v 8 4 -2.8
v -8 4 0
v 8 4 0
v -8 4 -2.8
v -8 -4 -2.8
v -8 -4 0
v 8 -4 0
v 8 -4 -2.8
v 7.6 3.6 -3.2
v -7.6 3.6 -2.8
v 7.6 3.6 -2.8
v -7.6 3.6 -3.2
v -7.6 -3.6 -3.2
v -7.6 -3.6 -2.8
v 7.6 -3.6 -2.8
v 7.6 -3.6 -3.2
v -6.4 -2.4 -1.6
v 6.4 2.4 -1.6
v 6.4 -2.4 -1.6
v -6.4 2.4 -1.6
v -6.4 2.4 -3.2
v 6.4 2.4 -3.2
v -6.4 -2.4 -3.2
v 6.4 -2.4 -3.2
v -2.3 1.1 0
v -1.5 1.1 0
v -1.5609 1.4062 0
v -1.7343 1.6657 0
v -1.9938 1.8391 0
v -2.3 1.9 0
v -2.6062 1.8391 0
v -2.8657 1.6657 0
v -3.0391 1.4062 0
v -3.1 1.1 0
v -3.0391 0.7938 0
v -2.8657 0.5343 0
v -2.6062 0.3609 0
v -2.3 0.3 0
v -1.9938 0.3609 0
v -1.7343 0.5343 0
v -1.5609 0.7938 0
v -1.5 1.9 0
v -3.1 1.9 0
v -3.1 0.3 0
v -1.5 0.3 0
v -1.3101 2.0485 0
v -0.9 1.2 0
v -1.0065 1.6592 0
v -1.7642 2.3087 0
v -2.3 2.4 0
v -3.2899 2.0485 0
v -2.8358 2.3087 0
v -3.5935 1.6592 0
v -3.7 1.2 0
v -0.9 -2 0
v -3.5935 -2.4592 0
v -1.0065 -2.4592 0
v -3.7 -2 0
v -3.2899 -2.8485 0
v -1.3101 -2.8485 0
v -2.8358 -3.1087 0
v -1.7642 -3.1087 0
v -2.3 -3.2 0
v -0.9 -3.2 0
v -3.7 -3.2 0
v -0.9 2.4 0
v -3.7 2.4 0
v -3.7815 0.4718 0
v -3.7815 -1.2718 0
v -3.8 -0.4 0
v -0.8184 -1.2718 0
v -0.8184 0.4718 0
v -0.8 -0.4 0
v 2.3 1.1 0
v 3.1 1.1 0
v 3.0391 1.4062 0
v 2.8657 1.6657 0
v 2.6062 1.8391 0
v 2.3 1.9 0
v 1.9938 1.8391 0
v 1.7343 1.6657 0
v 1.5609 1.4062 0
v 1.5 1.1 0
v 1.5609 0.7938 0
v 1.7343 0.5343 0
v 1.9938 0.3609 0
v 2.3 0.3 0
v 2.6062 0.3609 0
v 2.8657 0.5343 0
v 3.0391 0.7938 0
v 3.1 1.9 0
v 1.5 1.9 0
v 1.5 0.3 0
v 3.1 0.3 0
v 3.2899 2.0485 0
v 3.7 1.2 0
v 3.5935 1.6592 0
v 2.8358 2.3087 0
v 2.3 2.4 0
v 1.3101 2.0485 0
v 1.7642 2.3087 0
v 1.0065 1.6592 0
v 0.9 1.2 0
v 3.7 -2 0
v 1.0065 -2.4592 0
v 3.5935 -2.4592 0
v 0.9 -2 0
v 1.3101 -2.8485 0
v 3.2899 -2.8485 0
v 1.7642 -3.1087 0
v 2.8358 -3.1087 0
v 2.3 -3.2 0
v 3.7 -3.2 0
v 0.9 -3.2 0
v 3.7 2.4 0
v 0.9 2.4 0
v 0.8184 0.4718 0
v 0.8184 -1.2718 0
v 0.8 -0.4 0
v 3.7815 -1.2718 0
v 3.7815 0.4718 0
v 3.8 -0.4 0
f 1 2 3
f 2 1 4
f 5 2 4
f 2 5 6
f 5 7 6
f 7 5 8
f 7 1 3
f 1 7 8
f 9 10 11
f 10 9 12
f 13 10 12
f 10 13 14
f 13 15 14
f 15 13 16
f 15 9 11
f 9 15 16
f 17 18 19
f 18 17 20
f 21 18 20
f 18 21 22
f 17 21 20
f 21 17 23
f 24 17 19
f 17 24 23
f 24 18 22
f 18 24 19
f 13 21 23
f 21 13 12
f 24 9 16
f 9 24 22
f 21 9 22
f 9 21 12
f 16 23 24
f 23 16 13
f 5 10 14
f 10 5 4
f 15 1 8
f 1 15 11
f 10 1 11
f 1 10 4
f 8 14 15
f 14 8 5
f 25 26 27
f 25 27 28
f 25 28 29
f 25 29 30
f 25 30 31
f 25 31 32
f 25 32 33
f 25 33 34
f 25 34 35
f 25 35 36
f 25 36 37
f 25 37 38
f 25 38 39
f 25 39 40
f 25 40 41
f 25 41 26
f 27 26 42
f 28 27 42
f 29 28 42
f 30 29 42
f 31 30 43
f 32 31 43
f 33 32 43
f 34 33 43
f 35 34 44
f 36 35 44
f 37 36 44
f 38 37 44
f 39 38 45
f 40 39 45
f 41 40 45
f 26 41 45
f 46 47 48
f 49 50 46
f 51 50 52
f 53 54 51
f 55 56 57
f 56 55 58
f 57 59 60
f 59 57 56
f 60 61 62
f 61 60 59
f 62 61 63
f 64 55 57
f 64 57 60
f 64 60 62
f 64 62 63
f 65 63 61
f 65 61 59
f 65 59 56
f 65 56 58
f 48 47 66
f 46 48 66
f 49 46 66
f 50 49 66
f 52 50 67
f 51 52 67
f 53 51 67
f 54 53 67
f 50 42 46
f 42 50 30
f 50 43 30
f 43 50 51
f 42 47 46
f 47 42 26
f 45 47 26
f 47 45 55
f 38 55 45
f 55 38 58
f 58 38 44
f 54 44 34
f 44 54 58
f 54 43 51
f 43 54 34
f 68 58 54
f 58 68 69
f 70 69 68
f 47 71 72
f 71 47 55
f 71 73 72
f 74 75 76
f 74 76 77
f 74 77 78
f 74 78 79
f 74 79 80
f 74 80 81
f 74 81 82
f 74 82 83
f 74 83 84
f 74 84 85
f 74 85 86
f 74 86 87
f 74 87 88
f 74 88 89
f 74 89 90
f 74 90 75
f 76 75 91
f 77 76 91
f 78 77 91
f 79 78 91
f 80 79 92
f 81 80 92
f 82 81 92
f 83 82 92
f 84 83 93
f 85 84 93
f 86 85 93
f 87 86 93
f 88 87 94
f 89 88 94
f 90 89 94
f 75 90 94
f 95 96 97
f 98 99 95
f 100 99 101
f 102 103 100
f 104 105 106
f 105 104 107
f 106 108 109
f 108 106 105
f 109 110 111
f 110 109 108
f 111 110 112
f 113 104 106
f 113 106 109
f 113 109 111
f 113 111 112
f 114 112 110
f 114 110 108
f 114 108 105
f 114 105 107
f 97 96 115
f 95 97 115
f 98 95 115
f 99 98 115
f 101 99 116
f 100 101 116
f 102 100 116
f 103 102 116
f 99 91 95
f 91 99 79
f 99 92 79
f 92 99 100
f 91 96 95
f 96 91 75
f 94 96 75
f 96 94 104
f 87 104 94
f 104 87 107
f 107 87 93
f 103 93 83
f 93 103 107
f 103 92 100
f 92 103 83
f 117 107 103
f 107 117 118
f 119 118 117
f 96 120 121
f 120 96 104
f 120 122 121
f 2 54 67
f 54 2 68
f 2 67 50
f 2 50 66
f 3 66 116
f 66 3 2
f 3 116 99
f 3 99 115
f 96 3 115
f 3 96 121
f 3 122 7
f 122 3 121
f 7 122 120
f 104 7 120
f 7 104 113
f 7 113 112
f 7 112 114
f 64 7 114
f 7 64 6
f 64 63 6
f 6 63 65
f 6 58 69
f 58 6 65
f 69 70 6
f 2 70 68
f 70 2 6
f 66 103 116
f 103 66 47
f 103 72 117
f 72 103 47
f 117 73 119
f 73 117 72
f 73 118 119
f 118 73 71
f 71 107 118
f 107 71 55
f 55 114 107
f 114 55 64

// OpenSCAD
// file: ../p/box5.scad
use <../lib.scad>
function ldraw_lib__box5() = [
// 0 Box with 5 Faces and All Edges
// 0 Name: box5.dat
// 0 Author: James Jessiman
// 0 !LDRAW_ORG Primitive UPDATE 2012-01
// 0 !LICENSE Licensed under CC BY 2.0 and CC BY 4.0 : see CAreadme.txt
// 
// 0 BFC CERTIFY CCW
  [0,"BFC","CERTIFY"],
  [0,"BFC","CCW"],
// 
// 0 !HISTORY 2002-04-03 [sbliss] Modified for BFC compliance
// 0 !HISTORY 2002-04-25 [PTadmin] Official Update 2002-02
// 0 !HISTORY 2007-06-24 [PTadmin] Header formatted for Contributor Agreement
// 0 !HISTORY 2008-07-01 [PTadmin] Official Update 2008-01
// 0 !HISTORY 2012-02-16 [Philo] Changed to CCW
// 0 !HISTORY 2012-03-30 [PTadmin] Official Update 2012-01
// 
// 
// 2 24 1 1 1 -1 1 1
  [2,24,1,1,1,-1,1,1],
// 2 24 -1 1 1 -1 1 -1
  [2,24,-1,1,1,-1,1,-1],
// 2 24 -1 1 -1 1 1 -1
  [2,24,-1,1,-1,1,1,-1],
// 2 24 1 1 -1 1 1 1
  [2,24,1,1,-1,1,1,1],
// 2 24 1 0 1 -1 0 1
  [2,24,1,0,1,-1,0,1],
// 2 24 -1 0 1 -1 0 -1
  [2,24,-1,0,1,-1,0,-1],
// 2 24 -1 0 -1 1 0 -1
  [2,24,-1,0,-1,1,0,-1],
// 2 24 1 0 -1 1 0 1
  [2,24,1,0,-1,1,0,1],
// 2 24 1 0 1 1 1 1
  [2,24,1,0,1,1,1,1],
// 2 24 -1 0 1 -1 1 1
  [2,24,-1,0,1,-1,1,1],
// 2 24 1 0 -1 1 1 -1
  [2,24,1,0,-1,1,1,-1],
// 2 24 -1 0 -1 -1 1 -1
  [2,24,-1,0,-1,-1,1,-1],
// 4 16 -1 1 1 1 1 1 1 1 -1 -1 1 -1
  [4,16,-1,1,1,1,1,1,1,1,-1,-1,1,-1],
// 4 16 -1 1 1 -1 0 1 1 0 1 1 1 1
  [4,16,-1,1,1,-1,0,1,1,0,1,1,1,1],
// 4 16 -1 1 -1 -1 0 -1 -1 0 1 -1 1 1
  [4,16,-1,1,-1,-1,0,-1,-1,0,1,-1,1,1],
// 4 16 1 1 -1 1 0 -1 -1 0 -1 -1 1 -1
  [4,16,1,1,-1,1,0,-1,-1,0,-1,-1,1,-1],
// 4 16 1 1 1 1 0 1 1 0 -1 1 1 -1
  [4,16,1,1,1,1,0,1,1,0,-1,1,1,-1],
];
makepoly(ldraw_lib__box5(), line=0.2);
// file: ../p/box4.scad
use <../lib.scad>
function ldraw_lib__box4() = [
// 0 Box with 4 Faces (2 Parallel Pairs) and All Edges
// 0 Name: box4.dat
// 0 Author: James Jessiman
// 0 !LDRAW_ORG Primitive UPDATE 2012-01
// 0 !LICENSE Licensed under CC BY 2.0 and CC BY 4.0 : see CAreadme.txt
// 
// 0 BFC CERTIFY CCW
  [0,"BFC","CERTIFY"],
  [0,"BFC","CCW"],
// 
// 0 !HISTORY 2002-04-03 [sbliss] Modified for BFC compliance
// 0 !HISTORY 2002-04-25 [PTadmin] Official Update 2002-02
// 0 !HISTORY 2007-06-24 [PTadmin] Header formatted for Contributor Agreement
// 0 !HISTORY 2008-07-01 [PTadmin] Official Update 2008-01
// 0 !HISTORY 2012-02-16 [Philo] Changed to CCW
// 0 !HISTORY 2012-03-30 [PTadmin] Official Update 2012-01
// 
// 
// 2 24 1 1 1 -1 1 1
  [2,24,1,1,1,-1,1,1],
// 2 24 -1 1 1 -1 1 -1
  [2,24,-1,1,1,-1,1,-1],
// 2 24 -1 1 -1 1 1 -1
  [2,24,-1,1,-1,1,1,-1],
// 2 24 1 1 -1 1 1 1
  [2,24,1,1,-1,1,1,1],
// 2 24 1 0 1 -1 0 1
  [2,24,1,0,1,-1,0,1],
// 2 24 -1 0 1 -1 0 -1
  [2,24,-1,0,1,-1,0,-1],
// 2 24 -1 0 -1 1 0 -1
  [2,24,-1,0,-1,1,0,-1],
// 2 24 1 0 -1 1 0 1
  [2,24,1,0,-1,1,0,1],
// 2 24 1 0 1 1 1 1
  [2,24,1,0,1,1,1,1],
// 2 24 -1 0 1 -1 1 1
  [2,24,-1,0,1,-1,1,1],
// 2 24 1 0 -1 1 1 -1
  [2,24,1,0,-1,1,1,-1],
// 2 24 -1 0 -1 -1 1 -1
  [2,24,-1,0,-1,-1,1,-1],
// 4 16 -1 1 1 -1 0 1 1 0 1 1 1 1
  [4,16,-1,1,1,-1,0,1,1,0,1,1,1,1],
// 4 16 -1 1 -1 -1 0 -1 -1 0 1 -1 1 1
  [4,16,-1,1,-1,-1,0,-1,-1,0,1,-1,1,1],
// 4 16 1 1 -1 1 0 -1 -1 0 -1 -1 1 -1
  [4,16,1,1,-1,1,0,-1,-1,0,-1,-1,1,-1],
// 4 16 1 1 1 1 0 1 1 0 -1 1 1 -1
  [4,16,1,1,1,1,0,1,1,0,-1,1,1,-1],
];
makepoly(ldraw_lib__box4(), line=0.2);
// file: s/3069bs01.scad
use <../../lib.scad>
use <../../p/box4.scad>
use <../../p/box5.scad>
function ldraw_lib__s__3069bs01() = [
// 0 ~Tile  1 x  2 with Groove without Top Face
// 0 Name: s\3069bs01.dat
// 0 Author: Santeri Piippo [arezey]
// 0 !LDRAW_ORG Subpart UPDATE 2010-02
// 0 !LICENSE Licensed under CC BY 2.0 and CC BY 4.0 : see CAreadme.txt
// 
// 0 BFC CERTIFY CCW
  [0,"BFC","CERTIFY"],
  [0,"BFC","CCW"],
// 
// 0 !HISTORY 2010-07-05 [PTadmin] Official Update 2010-02
// 
// 
// 1 16 0 0 0 20 0 0 0 7 0 0 0 10 box4.dat
  [1,16,0,0,0,20,0,0,0,7,0,0,0,10, ldraw_lib__box4()],
// 1 16 0 7 0 19 0 0 0 1 0 0 0 9 box4.dat
  [1,16,0,7,0,19,0,0,0,1,0,0,0,9, ldraw_lib__box4()],
// 0 BFC INVERTNEXT
  [0,"BFC","INVERTNEXT"],
// 1 16 0 8 0 16 0 0 0 -4 0 0 0 6 box5.dat
  [1,16,0,8,0,16,0,0,0,-4,0,0,0,6, ldraw_lib__box5()],
// 4 16 -19 8 9 -16 8 6 -16 8 -6 -19 8 -9
  [4,16,-19,8,9,-16,8,6,-16,8,-6,-19,8,-9],
// 4 16 19 8 -9 16 8 -6 16 8 6 19 8 9
  [4,16,19,8,-9,16,8,-6,16,8,6,19,8,9],
// 4 16 19 8 9 16 8 6 -16 8 6 -19 8 9
  [4,16,19,8,9,16,8,6,-16,8,6,-19,8,9],
// 4 16 -19 8 -9 -16 8 -6 16 8 -6 19 8 -9
  [4,16,-19,8,-9,-16,8,-6,16,8,-6,19,8,-9],
// 4 16 -20 7 10 -19 7 9 -19 7 -9 -20 7 -10
  [4,16,-20,7,10,-19,7,9,-19,7,-9,-20,7,-10],
// 4 16 20 7 -10 19 7 -9 19 7 9 20 7 10
  [4,16,20,7,-10,19,7,-9,19,7,9,20,7,10],
// 4 16 20 7 10 19 7 9 -19 7 9 -20 7 10
  [4,16,20,7,10,19,7,9,-19,7,9,-20,7,10],
// 4 16 -20 7 -10 -19 7 -9 19 7 -9 20 7 -10
  [4,16,-20,7,-10,-19,7,-9,19,7,-9,20,7,-10],
// 0 //
];
makepoly(ldraw_lib__s__3069bs01(), line=0.2);
// file: ../p/4-4ndis.scad
use <../lib.scad>
function ldraw_lib__4_4ndis() = [
// 0 Disc Negative 1.0
// 0 Name: 4-4ndis.dat
// 0 Author: James Jessiman
// 0 !LDRAW_ORG Primitive UPDATE 2012-01
// 0 !LICENSE Licensed under CC BY 2.0 and CC BY 4.0 : see CAreadme.txt
// 
// 0 BFC CERTIFY CCW
  [0,"BFC","CERTIFY"],
  [0,"BFC","CCW"],
// 
// 0 !HISTORY 2002-03-23 [sbliss] Added BFC statement; compacted code
// 0 !HISTORY 2002-04-25 [PTadmin] Official Update 2002-02
// 0 !HISTORY 2007-06-24 [PTadmin] Header formatted for Contributor Agreement
// 0 !HISTORY 2008-07-01 [PTadmin] Official Update 2008-01
// 0 !HISTORY 2012-02-16 [Philo] Changed to CCW
// 0 !HISTORY 2012-03-30 [PTadmin] Official Update 2012-01
// 
// 
// 3 16 0.9239 0 0.3827 1 0 0 1 0 1
  [3,16,0.9239,0,0.3827,1,0,0,1,0,1],
// 3 16 0.7071 0 0.7071 0.9239 0 0.3827 1 0 1
  [3,16,0.7071,0,0.7071,0.9239,0,0.3827,1,0,1],
// 3 16 0.3827 0 0.9239 0.7071 0 0.7071 1 0 1
  [3,16,0.3827,0,0.9239,0.7071,0,0.7071,1,0,1],
// 3 16 0 0 1 0.3827 0 0.9239 1 0 1
  [3,16,0,0,1,0.3827,0,0.9239,1,0,1],
// 3 16 -0.3827 0 0.9239 0 0 1 -1 0 1
  [3,16,-0.3827,0,0.9239,0,0,1,-1,0,1],
// 3 16 -0.7071 0 0.7071 -0.3827 0 0.9239 -1 0 1
  [3,16,-0.7071,0,0.7071,-0.3827,0,0.9239,-1,0,1],
// 3 16 -0.9239 0 0.3827 -0.7071 0 0.7071 -1 0 1
  [3,16,-0.9239,0,0.3827,-0.7071,0,0.7071,-1,0,1],
// 3 16 -1 0 0 -0.9239 0 0.3827 -1 0 1
  [3,16,-1,0,0,-0.9239,0,0.3827,-1,0,1],
// 3 16 -0.9239 0 -0.3827 -1 0 0 -1 0 -1
  [3,16,-0.9239,0,-0.3827,-1,0,0,-1,0,-1],
// 3 16 -0.7071 0 -0.7071 -0.9239 0 -0.3827 -1 0 -1
  [3,16,-0.7071,0,-0.7071,-0.9239,0,-0.3827,-1,0,-1],
// 3 16 -0.3827 0 -0.9239 -0.7071 0 -0.7071 -1 0 -1
  [3,16,-0.3827,0,-0.9239,-0.7071,0,-0.7071,-1,0,-1],
// 3 16 0 0 -1 -0.3827 0 -0.9239 -1 0 -1
  [3,16,0,0,-1,-0.3827,0,-0.9239,-1,0,-1],
// 3 16 0.3827 0 -0.9239 0 0 -1 1 0 -1
  [3,16,0.3827,0,-0.9239,0,0,-1,1,0,-1],
// 3 16 0.7071 0 -0.7071 0.3827 0 -0.9239 1 0 -1
  [3,16,0.7071,0,-0.7071,0.3827,0,-0.9239,1,0,-1],
// 3 16 0.9239 0 -0.3827 0.7071 0 -0.7071 1 0 -1
  [3,16,0.9239,0,-0.3827,0.7071,0,-0.7071,1,0,-1],
// 3 16 1 0 0 0.9239 0 -0.3827 1 0 -1
  [3,16,1,0,0,0.9239,0,-0.3827,1,0,-1],
];
makepoly(ldraw_lib__4_4ndis(), line=0.2);
// file: ../p/4-4disc.scad
use <../lib.scad>
function ldraw_lib__4_4disc() = [
// 0 Disc 1.0
// 0 Name: 4-4disc.dat
// 0 Author: James Jessiman
// 0 !LDRAW_ORG Primitive UPDATE 2002-02
// 0 !LICENSE Licensed under CC BY 2.0 and CC BY 4.0 : see CAreadme.txt
// 
// 0 BFC CERTIFY CCW
  [0,"BFC","CERTIFY"],
  [0,"BFC","CCW"],
// 
// 0 !HISTORY 1998-12-15 [PTadmin] Official Update 1998-10
// 0 !HISTORY 2002-03-23 [sbliss] Added BFC statement
// 0 !HISTORY 2002-04-25 [PTadmin] Official Update 2002-02
// 0 !HISTORY 2007-06-24 [PTadmin] Header formatted for Contributor Agreement
// 0 !HISTORY 2008-07-01 [PTadmin] Official Update 2008-01
// 
// 
// 3 16 0 0 0 1 0 0 0.9239 0 0.3827
  [3,16,0,0,0,1,0,0,0.9239,0,0.3827],
// 3 16 0 0 0 0.9239 0 0.3827 0.7071 0 0.7071
  [3,16,0,0,0,0.9239,0,0.3827,0.7071,0,0.7071],
// 3 16 0 0 0 0.7071 0 0.7071 0.3827 0 0.9239
  [3,16,0,0,0,0.7071,0,0.7071,0.3827,0,0.9239],
// 3 16 0 0 0 0.3827 0 0.9239 0 0 1
  [3,16,0,0,0,0.3827,0,0.9239,0,0,1],
// 3 16 0 0 0 0 0 1 -0.3827 0 0.9239
  [3,16,0,0,0,0,0,1,-0.3827,0,0.9239],
// 3 16 0 0 0 -0.3827 0 0.9239 -0.7071 0 0.7071
  [3,16,0,0,0,-0.3827,0,0.9239,-0.7071,0,0.7071],
// 3 16 0 0 0 -0.7071 0 0.7071 -0.9239 0 0.3827
  [3,16,0,0,0,-0.7071,0,0.7071,-0.9239,0,0.3827],
// 3 16 0 0 0 -0.9239 0 0.3827 -1 0 -0
  [3,16,0,0,0,-0.9239,0,0.3827,-1,0,-0],
// 3 16 0 0 0 -1 0 -0 -0.9239 0 -0.3827
  [3,16,0,0,0,-1,0,-0,-0.9239,0,-0.3827],
// 3 16 0 0 0 -0.9239 0 -0.3827 -0.7071 0 -0.7071
  [3,16,0,0,0,-0.9239,0,-0.3827,-0.7071,0,-0.7071],
// 3 16 0 0 0 -0.7071 0 -0.7071 -0.3827 0 -0.9239
  [3,16,0,0,0,-0.7071,0,-0.7071,-0.3827,0,-0.9239],
// 3 16 0 0 0 -0.3827 0 -0.9239 0 0 -1
  [3,16,0,0,0,-0.3827,0,-0.9239,0,0,-1],
// 3 16 0 0 0 0 0 -1 0.3827 0 -0.9239
  [3,16,0,0,0,0,0,-1,0.3827,0,-0.9239],
// 3 16 0 0 0 0.3827 0 -0.9239 0.7071 0 -0.7071
  [3,16,0,0,0,0.3827,0,-0.9239,0.7071,0,-0.7071],
// 3 16 0 0 0 0.7071 0 -0.7071 0.9239 0 -0.3827
  [3,16,0,0,0,0.7071,0,-0.7071,0.9239,0,-0.3827],
// 3 16 0 0 0 0.9239 0 -0.3827 1 0 0
  [3,16,0,0,0,0.9239,0,-0.3827,1,0,0],
// 0
];
makepoly(ldraw_lib__4_4disc(), line=0.2);
// file: ../p/2-4ndis.scad
use <../lib.scad>
function ldraw_lib__2_4ndis() = [
// 0 Disc Negative 0.5
// 0 Name: 2-4ndis.dat
// 0 Author: James Jessiman
// 0 !LDRAW_ORG Primitive UPDATE 2012-01
// 0 !LICENSE Licensed under CC BY 2.0 and CC BY 4.0 : see CAreadme.txt
// 
// 0 BFC CERTIFY CCW
  [0,"BFC","CERTIFY"],
  [0,"BFC","CCW"],
// 
// 0 !HISTORY 2002-03-23 [sbliss] Added BFC statement; compacted code
// 0 !HISTORY 2002-04-25 [PTadmin] Official Update 2002-02
// 0 !HISTORY 2007-06-24 [PTadmin] Header formatted for Contributor Agreement
// 0 !HISTORY 2008-07-01 [PTadmin] Official Update 2008-01
// 0 !HISTORY 2012-02-16 [Philo] Changed to CCW
// 0 !HISTORY 2012-03-30 [PTadmin] Official Update 2012-01
// 
// 
// 3 16 0.9239 0 0.3827 1 0 0 1 0 1
  [3,16,0.9239,0,0.3827,1,0,0,1,0,1],
// 3 16 0.7071 0 0.7071 0.9239 0 0.3827 1 0 1
  [3,16,0.7071,0,0.7071,0.9239,0,0.3827,1,0,1],
// 3 16 0.3827 0 0.9239 0.7071 0 0.7071 1 0 1
  [3,16,0.3827,0,0.9239,0.7071,0,0.7071,1,0,1],
// 3 16 0 0 1 0.3827 0 0.9239 1 0 1
  [3,16,0,0,1,0.3827,0,0.9239,1,0,1],
// 3 16 -0.3827 0 0.9239 0 0 1 -1 0 1
  [3,16,-0.3827,0,0.9239,0,0,1,-1,0,1],
// 3 16 -0.7071 0 0.7071 -0.3827 0 0.9239 -1 0 1
  [3,16,-0.7071,0,0.7071,-0.3827,0,0.9239,-1,0,1],
// 3 16 -0.9239 0 0.3827 -0.7071 0 0.7071 -1 0 1
  [3,16,-0.9239,0,0.3827,-0.7071,0,0.7071,-1,0,1],
// 3 16 -1 0 0 -0.9239 0 0.3827 -1 0 1
  [3,16,-1,0,0,-0.9239,0,0.3827,-1,0,1],
];
makepoly(ldraw_lib__2_4ndis(), line=0.2);
// file: ../p/2-4chrd.scad
use <../lib.scad>
function ldraw_lib__2_4chrd() = [
// 0 Chord 0.5
// 0 Name: 2-4chrd.dat
// 0 Author: Philippe Hurbain [Philo]
// 0 !LDRAW_ORG Primitive UPDATE 2014-01
// 0 !LICENSE Licensed under CC BY 2.0 and CC BY 4.0 : see CAreadme.txt
// 
// 0 BFC CERTIFY CCW
  [0,"BFC","CERTIFY"],
  [0,"BFC","CCW"],
// 
// 0 !HISTORY 2014-06-21 [PTadmin] Official Update 2014-01
// 
// 
// 4 16 0.9239 0 0.3827 -0.9239 0 0.3827 -1 0 0 1 0 0
  [4,16,0.9239,0,0.3827,-0.9239,0,0.3827,-1,0,0,1,0,0],
// 4 16 0.7071 0 0.7071 -0.7071 0 0.7071 -0.9239 0 0.3827 0.9239 0 0.3827
  [4,16,0.7071,0,0.7071,-0.7071,0,0.7071,-0.9239,0,0.3827,0.9239,0,0.3827],
// 4 16 0.3827 0 0.9239 -0.3827 0 0.9239 -0.7071 0 0.7071 0.7071 0 0.7071
  [4,16,0.3827,0,0.9239,-0.3827,0,0.9239,-0.7071,0,0.7071,0.7071,0,0.7071],
// 3 16 0 0 1 -0.3827 0 0.9239 0.3827 0 0.9239
  [3,16,0,0,1,-0.3827,0,0.9239,0.3827,0,0.9239],
];
makepoly(ldraw_lib__2_4chrd(), line=0.2);
// file: ../p/1-8chrd.scad
use <../lib.scad>
function ldraw_lib__1_8chrd() = [
// 0 Chord 0.125
// 0 Name: 1-8chrd.dat
// 0 Author: Andy Westrate [westrate]
// 0 !LDRAW_ORG Primitive UPDATE 2004-02
// 0 !LICENSE Licensed under CC BY 2.0 and CC BY 4.0 : see CAreadme.txt
// 
// 0 BFC CERTIFY CCW
  [0,"BFC","CERTIFY"],
  [0,"BFC","CCW"],
// 
// 0 !HISTORY 2004-04-22 [PTadmin] Official Update 2004-02
// 0 !HISTORY 2007-06-22 [PTadmin] Header formatted for Contributor Agreement
// 0 !HISTORY 2008-07-01 [PTadmin] Official Update 2008-01
// 
// 
// 3 16 0.7071 0 0.7071 1 0 0 0.9239 0 0.3827
  [3,16,0.7071,0,0.7071,1,0,0,0.9239,0,0.3827],
// 
// 0
];
makepoly(ldraw_lib__1_8chrd(), line=0.2);
// main file
use <../lib.scad>
use <../p/1-8chrd.scad>
use <../p/2-4chrd.scad>
use <../p/2-4ndis.scad>
use <../p/4-4disc.scad>
use <../p/4-4ndis.scad>
use <s/3069bs01.scad>
function ldraw_lib__3069bpx8() = [
// 0 Tile  1 x  2 with  2 Eyes Pattern
// 0 Name: 3069bpx8.dat
// 0 Author: Vincent Messenet [Cheenzo]
// 0 !LDRAW_ORG Part UPDATE 2022-01
// 0 !LICENSE Licensed under CC BY 2.0 and CC BY 4.0 : see CAreadme.txt
// 
// 0 BFC CERTIFY CCW
  [0,"BFC","CERTIFY"],
  [0,"BFC","CCW"],
// 
// 0 !KEYWORDS Foo, Mario, Nintendo, Set 71386
// 
// 0 !HISTORY 2022-01-14 [PTadmin] Official Update 2022-01
// 
// 
// 1 16 0 0 0 1 0 0 0 1 0 0 0 1 s\3069bs01.dat
  [1,16,0,0,0,1,0,0,0,1,0,0,0,1, ldraw_lib__s__3069bs01()],
// 
// 1 16 -5.75 0 2.75 2 0 0 0 1 0 0 0 2 4-4disc.dat
  [1,16,-5.75,0,2.75,2,0,0,0,1,0,0,0,2, ldraw_lib__4_4disc()],
// 1 0 -5.75 0 2.75 2 0 0 0 1 0 0 0 2 4-4ndis.dat
  [1,0,-5.75,0,2.75,2,0,0,0,1,0,0,0,2, ldraw_lib__4_4ndis()],
// 1 0 -5.75 0 3 3.5 0 0 0 1 0 0 0 3 1-8chrd.dat
  [1,0,-5.75,0,3,3.5,0,0,0,1,0,0,0,3, ldraw_lib__1_8chrd()],
// 1 0 -5.75 0 3 0 0 3.5 0 1 0 3 0 0 1-8chrd.dat
  [1,0,-5.75,0,3,0,0,3.5,0,1,0,3,0,0, ldraw_lib__1_8chrd()],
// 1 0 -5.75 0 3 0 0 -3.5 0 1 0 3 0 0 1-8chrd.dat
  [1,0,-5.75,0,3,0,0,-3.5,0,1,0,3,0,0, ldraw_lib__1_8chrd()],
// 1 0 -5.75 0 3 -3.5 0 0 0 1 0 0 0 3 1-8chrd.dat
  [1,0,-5.75,0,3,-3.5,0,0,0,1,0,0,0,3, ldraw_lib__1_8chrd()],
// 1 0 -5.75 0 -5 3.5 0 0 0 1 0 0 0 -3 2-4chrd.dat
  [1,0,-5.75,0,-5,3.5,0,0,0,1,0,0,0,-3, ldraw_lib__2_4chrd()],
// 1 16 -5.75 0 -5 3.5 0 0 0 1 0 0 0 -3 2-4ndis.dat
  [1,16,-5.75,0,-5,3.5,0,0,0,1,0,0,0,-3, ldraw_lib__2_4ndis()],
// 1 16 -5.75 0 3 3.5 0 0 0 1 0 0 0 3 2-4ndis.dat
  [1,16,-5.75,0,3,3.5,0,0,0,1,0,0,0,3, ldraw_lib__2_4ndis()],
// 4 0 -3.27515 0 5.1213 -5.75 0 6 -5.75 0 4.75 -3.75 0 4.75
  [4,0,-3.27515,0,5.1213,-5.75,0,6,-5.75,0,4.75,-3.75,0,4.75],
// 4 0 -8.22485 0 5.1213 -7.75 0 4.75 -5.75 0 4.75 -5.75 0 6
  [4,0,-8.22485,0,5.1213,-7.75,0,4.75,-5.75,0,4.75,-5.75,0,6],
// 4 0 -3.75 0 2.75 -2.25 0 3 -3.27515 0 5.1213 -3.75 0 4.75
  [4,0,-3.75,0,2.75,-2.25,0,3,-3.27515,0,5.1213,-3.75,0,4.75],
// 4 0 -2.25 0 -5 -2.25 0 3 -3.75 0 2.75 -3.75 0 .75
  [4,0,-2.25,0,-5,-2.25,0,3,-3.75,0,2.75,-3.75,0,.75],
// 4 0 -9.25 0 -5 -2.25 0 -5 -3.75 0 .75 -5.75 0 .75
  [4,0,-9.25,0,-5,-2.25,0,-5,-3.75,0,.75,-5.75,0,.75],
// 3 0 -9.25 0 -5 -5.75 0 .75 -7.75 0 .75
  [3,0,-9.25,0,-5,-5.75,0,.75,-7.75,0,.75],
// 4 0 -9.25 0 -5 -7.75 0 .75 -7.75 0 2.75 -9.25 0 3
  [4,0,-9.25,0,-5,-7.75,0,.75,-7.75,0,2.75,-9.25,0,3],
// 4 0 -7.75 0 4.75 -8.22485 0 5.1213 -9.25 0 3 -7.75 0 2.75
  [4,0,-7.75,0,4.75,-8.22485,0,5.1213,-9.25,0,3,-7.75,0,2.75],
// 4 0 -9.453875 0 1.1796 -9.453875 0 -3.1796 -9.25 0 -5 -9.25 0 3
  [4,0,-9.453875,0,1.1796,-9.453875,0,-3.1796,-9.25,0,-5,-9.25,0,3],
// 3 0 -9.5 0 -1 -9.453875 0 -3.1796 -9.453875 0 1.1796
  [3,0,-9.5,0,-1,-9.453875,0,-3.1796,-9.453875,0,1.1796],
// 4 0 -2.046125 0 1.1796 -2.25 0 3 -2.25 0 -5 -2.046125 0 -3.1796
  [4,0,-2.046125,0,1.1796,-2.25,0,3,-2.25,0,-5,-2.046125,0,-3.1796],
// 3 0 -2.046125 0 -3.1796 -2 0 -1 -2.046125 0 1.1796
  [3,0,-2.046125,0,-3.1796,-2,0,-1,-2.046125,0,1.1796],
// 1 16 5.75 0 2.75 2 0 0 0 1 0 0 0 2 4-4disc.dat
  [1,16,5.75,0,2.75,2,0,0,0,1,0,0,0,2, ldraw_lib__4_4disc()],
// 1 0 5.75 0 2.75 2 0 0 0 1 0 0 0 2 4-4ndis.dat
  [1,0,5.75,0,2.75,2,0,0,0,1,0,0,0,2, ldraw_lib__4_4ndis()],
// 1 0 5.75 0 3 3.5 0 0 0 1 0 0 0 3 1-8chrd.dat
  [1,0,5.75,0,3,3.5,0,0,0,1,0,0,0,3, ldraw_lib__1_8chrd()],
// 1 0 5.75 0 3 0 0 3.5 0 1 0 3 0 0 1-8chrd.dat
  [1,0,5.75,0,3,0,0,3.5,0,1,0,3,0,0, ldraw_lib__1_8chrd()],
// 1 0 5.75 0 3 0 0 -3.5 0 1 0 3 0 0 1-8chrd.dat
  [1,0,5.75,0,3,0,0,-3.5,0,1,0,3,0,0, ldraw_lib__1_8chrd()],
// 1 0 5.75 0 3 -3.5 0 0 0 1 0 0 0 3 1-8chrd.dat
  [1,0,5.75,0,3,-3.5,0,0,0,1,0,0,0,3, ldraw_lib__1_8chrd()],
// 1 0 5.75 0 -5 3.5 0 0 0 1 0 0 0 -3 2-4chrd.dat
  [1,0,5.75,0,-5,3.5,0,0,0,1,0,0,0,-3, ldraw_lib__2_4chrd()],
// 1 16 5.75 0 -5 3.5 0 0 0 1 0 0 0 -3 2-4ndis.dat
  [1,16,5.75,0,-5,3.5,0,0,0,1,0,0,0,-3, ldraw_lib__2_4ndis()],
// 1 16 5.75 0 3 3.5 0 0 0 1 0 0 0 3 2-4ndis.dat
  [1,16,5.75,0,3,3.5,0,0,0,1,0,0,0,3, ldraw_lib__2_4ndis()],
// 4 0 8.22485 0 5.1213 5.75 0 6 5.75 0 4.75 7.75 0 4.75
  [4,0,8.22485,0,5.1213,5.75,0,6,5.75,0,4.75,7.75,0,4.75],
// 4 0 3.27515 0 5.1213 3.75 0 4.75 5.75 0 4.75 5.75 0 6
  [4,0,3.27515,0,5.1213,3.75,0,4.75,5.75,0,4.75,5.75,0,6],
// 4 0 7.75 0 2.75 9.25 0 3 8.22485 0 5.1213 7.75 0 4.75
  [4,0,7.75,0,2.75,9.25,0,3,8.22485,0,5.1213,7.75,0,4.75],
// 4 0 9.25 0 -5 9.25 0 3 7.75 0 2.75 7.75 0 .75
  [4,0,9.25,0,-5,9.25,0,3,7.75,0,2.75,7.75,0,.75],
// 4 0 2.25 0 -5 9.25 0 -5 7.75 0 .75 5.75 0 .75
  [4,0,2.25,0,-5,9.25,0,-5,7.75,0,.75,5.75,0,.75],
// 3 0 2.25 0 -5 5.75 0 .75 3.75 0 .75
  [3,0,2.25,0,-5,5.75,0,.75,3.75,0,.75],
// 4 0 2.25 0 -5 3.75 0 .75 3.75 0 2.75 2.25 0 3
  [4,0,2.25,0,-5,3.75,0,.75,3.75,0,2.75,2.25,0,3],
// 4 0 3.75 0 4.75 3.27515 0 5.1213 2.25 0 3 3.75 0 2.75
  [4,0,3.75,0,4.75,3.27515,0,5.1213,2.25,0,3,3.75,0,2.75],
// 4 0 2.046125 0 1.1796 2.046125 0 -3.1796 2.25 0 -5 2.25 0 3
  [4,0,2.046125,0,1.1796,2.046125,0,-3.1796,2.25,0,-5,2.25,0,3],
// 3 0 2 0 -1 2.046125 0 -3.1796 2.046125 0 1.1796
  [3,0,2,0,-1,2.046125,0,-3.1796,2.046125,0,1.1796],
// 4 0 9.453875 0 1.1796 9.25 0 3 9.25 0 -5 9.453875 0 -3.1796
  [4,0,9.453875,0,1.1796,9.25,0,3,9.25,0,-5,9.453875,0,-3.1796],
// 3 0 9.453875 0 -3.1796 9.5 0 -1 9.453875 0 1.1796
  [3,0,9.453875,0,-3.1796,9.5,0,-1,9.453875,0,1.1796],
// 4 16 -9.25 0 3 -9.25 0 6 -20 0 10 -9.453875 0 1.1796
  [4,16,-9.25,0,3,-9.25,0,6,-20,0,10,-9.453875,0,1.1796],
// 3 16 -20 0 10 -9.25 0 6 -5.75 0 6
  [3,16,-20,0,10,-9.25,0,6,-5.75,0,6],
// 3 16 -20 0 10 -5.75 0 6 -2.25 0 6
  [3,16,-20,0,10,-5.75,0,6,-2.25,0,6],
// 4 16 -20 0 10 -2.25 0 6 2.25 0 6 20 0 10
  [4,16,-20,0,10,-2.25,0,6,2.25,0,6,20,0,10],
// 3 16 20 0 10 2.25 0 6 5.75 0 6
  [3,16,20,0,10,2.25,0,6,5.75,0,6],
// 3 16 20 0 10 5.75 0 6 9.25 0 6
  [3,16,20,0,10,5.75,0,6,9.25,0,6],
// 4 16 20 0 10 9.25 0 6 9.25 0 3 9.453875 0 1.1796
  [4,16,20,0,10,9.25,0,6,9.25,0,3,9.453875,0,1.1796],
// 4 16 20 0 10 9.453875 0 1.1796 9.5 0 -1 20 0 -10
  [4,16,20,0,10,9.453875,0,1.1796,9.5,0,-1,20,0,-10],
// 3 16 20 0 -10 9.5 0 -1 9.453875 0 -3.1796
  [3,16,20,0,-10,9.5,0,-1,9.453875,0,-3.1796],
// 4 16 20 0 -10 9.453875 0 -3.1796 9.25 0 -5 9.25 0 -8
  [4,16,20,0,-10,9.453875,0,-3.1796,9.25,0,-5,9.25,0,-8],
// 3 16 20 0 -10 9.25 0 -8 5.75 0 -8
  [3,16,20,0,-10,9.25,0,-8,5.75,0,-8],
// 3 16 20 0 -10 5.75 0 -8 2.25 0 -8
  [3,16,20,0,-10,5.75,0,-8,2.25,0,-8],
// 4 16 20 0 -10 2.25 0 -8 -2.25 0 -8 -20 0 -10
  [4,16,20,0,-10,2.25,0,-8,-2.25,0,-8,-20,0,-10],
// 3 16 -2.25 0 -8 -5.75 0 -8 -20 0 -10
  [3,16,-2.25,0,-8,-5.75,0,-8,-20,0,-10],
// 3 16 -20 0 -10 -5.75 0 -8 -9.25 0 -8
  [3,16,-20,0,-10,-5.75,0,-8,-9.25,0,-8],
// 4 16 -9.25 0 -8 -9.25 0 -5 -9.453875 0 -3.1796 -20 0 -10
  [4,16,-9.25,0,-8,-9.25,0,-5,-9.453875,0,-3.1796,-20,0,-10],
// 3 16 -9.453875 0 -3.1796 -9.5 0 -1 -20 0 -10
  [3,16,-9.453875,0,-3.1796,-9.5,0,-1,-20,0,-10],
// 4 16 -20 0 -10 -9.5 0 -1 -9.453875 0 1.1796 -20 0 10
  [4,16,-20,0,-10,-9.5,0,-1,-9.453875,0,1.1796,-20,0,10],
// 4 16 2.25 0 3 2.25 0 6 -2.25 0 6 -2.25 0 3
  [4,16,2.25,0,3,2.25,0,6,-2.25,0,6,-2.25,0,3],
// 4 16 2.046125 0 1.1796 2.25 0 3 -2.25 0 3 -2.046125 0 1.1796
  [4,16,2.046125,0,1.1796,2.25,0,3,-2.25,0,3,-2.046125,0,1.1796],
// 4 16 2 0 -1 2.046125 0 1.1796 -2.046125 0 1.1796 -2 0 -1
  [4,16,2,0,-1,2.046125,0,1.1796,-2.046125,0,1.1796,-2,0,-1],
// 4 16 2.046125 0 -3.1796 2 0 -1 -2 0 -1 -2.046125 0 -3.1796
  [4,16,2.046125,0,-3.1796,2,0,-1,-2,0,-1,-2.046125,0,-3.1796],
// 4 16 2.25 0 -5 2.046125 0 -3.1796 -2.046125 0 -3.1796 -2.25 0 -5
  [4,16,2.25,0,-5,2.046125,0,-3.1796,-2.046125,0,-3.1796,-2.25,0,-5],
// 4 16 2.25 0 -5 -2.25 0 -5 -2.25 0 -8 2.25 0 -8
  [4,16,2.25,0,-5,-2.25,0,-5,-2.25,0,-8,2.25,0,-8],
];
makepoly(ldraw_lib__3069bpx8(), line=0.2);
